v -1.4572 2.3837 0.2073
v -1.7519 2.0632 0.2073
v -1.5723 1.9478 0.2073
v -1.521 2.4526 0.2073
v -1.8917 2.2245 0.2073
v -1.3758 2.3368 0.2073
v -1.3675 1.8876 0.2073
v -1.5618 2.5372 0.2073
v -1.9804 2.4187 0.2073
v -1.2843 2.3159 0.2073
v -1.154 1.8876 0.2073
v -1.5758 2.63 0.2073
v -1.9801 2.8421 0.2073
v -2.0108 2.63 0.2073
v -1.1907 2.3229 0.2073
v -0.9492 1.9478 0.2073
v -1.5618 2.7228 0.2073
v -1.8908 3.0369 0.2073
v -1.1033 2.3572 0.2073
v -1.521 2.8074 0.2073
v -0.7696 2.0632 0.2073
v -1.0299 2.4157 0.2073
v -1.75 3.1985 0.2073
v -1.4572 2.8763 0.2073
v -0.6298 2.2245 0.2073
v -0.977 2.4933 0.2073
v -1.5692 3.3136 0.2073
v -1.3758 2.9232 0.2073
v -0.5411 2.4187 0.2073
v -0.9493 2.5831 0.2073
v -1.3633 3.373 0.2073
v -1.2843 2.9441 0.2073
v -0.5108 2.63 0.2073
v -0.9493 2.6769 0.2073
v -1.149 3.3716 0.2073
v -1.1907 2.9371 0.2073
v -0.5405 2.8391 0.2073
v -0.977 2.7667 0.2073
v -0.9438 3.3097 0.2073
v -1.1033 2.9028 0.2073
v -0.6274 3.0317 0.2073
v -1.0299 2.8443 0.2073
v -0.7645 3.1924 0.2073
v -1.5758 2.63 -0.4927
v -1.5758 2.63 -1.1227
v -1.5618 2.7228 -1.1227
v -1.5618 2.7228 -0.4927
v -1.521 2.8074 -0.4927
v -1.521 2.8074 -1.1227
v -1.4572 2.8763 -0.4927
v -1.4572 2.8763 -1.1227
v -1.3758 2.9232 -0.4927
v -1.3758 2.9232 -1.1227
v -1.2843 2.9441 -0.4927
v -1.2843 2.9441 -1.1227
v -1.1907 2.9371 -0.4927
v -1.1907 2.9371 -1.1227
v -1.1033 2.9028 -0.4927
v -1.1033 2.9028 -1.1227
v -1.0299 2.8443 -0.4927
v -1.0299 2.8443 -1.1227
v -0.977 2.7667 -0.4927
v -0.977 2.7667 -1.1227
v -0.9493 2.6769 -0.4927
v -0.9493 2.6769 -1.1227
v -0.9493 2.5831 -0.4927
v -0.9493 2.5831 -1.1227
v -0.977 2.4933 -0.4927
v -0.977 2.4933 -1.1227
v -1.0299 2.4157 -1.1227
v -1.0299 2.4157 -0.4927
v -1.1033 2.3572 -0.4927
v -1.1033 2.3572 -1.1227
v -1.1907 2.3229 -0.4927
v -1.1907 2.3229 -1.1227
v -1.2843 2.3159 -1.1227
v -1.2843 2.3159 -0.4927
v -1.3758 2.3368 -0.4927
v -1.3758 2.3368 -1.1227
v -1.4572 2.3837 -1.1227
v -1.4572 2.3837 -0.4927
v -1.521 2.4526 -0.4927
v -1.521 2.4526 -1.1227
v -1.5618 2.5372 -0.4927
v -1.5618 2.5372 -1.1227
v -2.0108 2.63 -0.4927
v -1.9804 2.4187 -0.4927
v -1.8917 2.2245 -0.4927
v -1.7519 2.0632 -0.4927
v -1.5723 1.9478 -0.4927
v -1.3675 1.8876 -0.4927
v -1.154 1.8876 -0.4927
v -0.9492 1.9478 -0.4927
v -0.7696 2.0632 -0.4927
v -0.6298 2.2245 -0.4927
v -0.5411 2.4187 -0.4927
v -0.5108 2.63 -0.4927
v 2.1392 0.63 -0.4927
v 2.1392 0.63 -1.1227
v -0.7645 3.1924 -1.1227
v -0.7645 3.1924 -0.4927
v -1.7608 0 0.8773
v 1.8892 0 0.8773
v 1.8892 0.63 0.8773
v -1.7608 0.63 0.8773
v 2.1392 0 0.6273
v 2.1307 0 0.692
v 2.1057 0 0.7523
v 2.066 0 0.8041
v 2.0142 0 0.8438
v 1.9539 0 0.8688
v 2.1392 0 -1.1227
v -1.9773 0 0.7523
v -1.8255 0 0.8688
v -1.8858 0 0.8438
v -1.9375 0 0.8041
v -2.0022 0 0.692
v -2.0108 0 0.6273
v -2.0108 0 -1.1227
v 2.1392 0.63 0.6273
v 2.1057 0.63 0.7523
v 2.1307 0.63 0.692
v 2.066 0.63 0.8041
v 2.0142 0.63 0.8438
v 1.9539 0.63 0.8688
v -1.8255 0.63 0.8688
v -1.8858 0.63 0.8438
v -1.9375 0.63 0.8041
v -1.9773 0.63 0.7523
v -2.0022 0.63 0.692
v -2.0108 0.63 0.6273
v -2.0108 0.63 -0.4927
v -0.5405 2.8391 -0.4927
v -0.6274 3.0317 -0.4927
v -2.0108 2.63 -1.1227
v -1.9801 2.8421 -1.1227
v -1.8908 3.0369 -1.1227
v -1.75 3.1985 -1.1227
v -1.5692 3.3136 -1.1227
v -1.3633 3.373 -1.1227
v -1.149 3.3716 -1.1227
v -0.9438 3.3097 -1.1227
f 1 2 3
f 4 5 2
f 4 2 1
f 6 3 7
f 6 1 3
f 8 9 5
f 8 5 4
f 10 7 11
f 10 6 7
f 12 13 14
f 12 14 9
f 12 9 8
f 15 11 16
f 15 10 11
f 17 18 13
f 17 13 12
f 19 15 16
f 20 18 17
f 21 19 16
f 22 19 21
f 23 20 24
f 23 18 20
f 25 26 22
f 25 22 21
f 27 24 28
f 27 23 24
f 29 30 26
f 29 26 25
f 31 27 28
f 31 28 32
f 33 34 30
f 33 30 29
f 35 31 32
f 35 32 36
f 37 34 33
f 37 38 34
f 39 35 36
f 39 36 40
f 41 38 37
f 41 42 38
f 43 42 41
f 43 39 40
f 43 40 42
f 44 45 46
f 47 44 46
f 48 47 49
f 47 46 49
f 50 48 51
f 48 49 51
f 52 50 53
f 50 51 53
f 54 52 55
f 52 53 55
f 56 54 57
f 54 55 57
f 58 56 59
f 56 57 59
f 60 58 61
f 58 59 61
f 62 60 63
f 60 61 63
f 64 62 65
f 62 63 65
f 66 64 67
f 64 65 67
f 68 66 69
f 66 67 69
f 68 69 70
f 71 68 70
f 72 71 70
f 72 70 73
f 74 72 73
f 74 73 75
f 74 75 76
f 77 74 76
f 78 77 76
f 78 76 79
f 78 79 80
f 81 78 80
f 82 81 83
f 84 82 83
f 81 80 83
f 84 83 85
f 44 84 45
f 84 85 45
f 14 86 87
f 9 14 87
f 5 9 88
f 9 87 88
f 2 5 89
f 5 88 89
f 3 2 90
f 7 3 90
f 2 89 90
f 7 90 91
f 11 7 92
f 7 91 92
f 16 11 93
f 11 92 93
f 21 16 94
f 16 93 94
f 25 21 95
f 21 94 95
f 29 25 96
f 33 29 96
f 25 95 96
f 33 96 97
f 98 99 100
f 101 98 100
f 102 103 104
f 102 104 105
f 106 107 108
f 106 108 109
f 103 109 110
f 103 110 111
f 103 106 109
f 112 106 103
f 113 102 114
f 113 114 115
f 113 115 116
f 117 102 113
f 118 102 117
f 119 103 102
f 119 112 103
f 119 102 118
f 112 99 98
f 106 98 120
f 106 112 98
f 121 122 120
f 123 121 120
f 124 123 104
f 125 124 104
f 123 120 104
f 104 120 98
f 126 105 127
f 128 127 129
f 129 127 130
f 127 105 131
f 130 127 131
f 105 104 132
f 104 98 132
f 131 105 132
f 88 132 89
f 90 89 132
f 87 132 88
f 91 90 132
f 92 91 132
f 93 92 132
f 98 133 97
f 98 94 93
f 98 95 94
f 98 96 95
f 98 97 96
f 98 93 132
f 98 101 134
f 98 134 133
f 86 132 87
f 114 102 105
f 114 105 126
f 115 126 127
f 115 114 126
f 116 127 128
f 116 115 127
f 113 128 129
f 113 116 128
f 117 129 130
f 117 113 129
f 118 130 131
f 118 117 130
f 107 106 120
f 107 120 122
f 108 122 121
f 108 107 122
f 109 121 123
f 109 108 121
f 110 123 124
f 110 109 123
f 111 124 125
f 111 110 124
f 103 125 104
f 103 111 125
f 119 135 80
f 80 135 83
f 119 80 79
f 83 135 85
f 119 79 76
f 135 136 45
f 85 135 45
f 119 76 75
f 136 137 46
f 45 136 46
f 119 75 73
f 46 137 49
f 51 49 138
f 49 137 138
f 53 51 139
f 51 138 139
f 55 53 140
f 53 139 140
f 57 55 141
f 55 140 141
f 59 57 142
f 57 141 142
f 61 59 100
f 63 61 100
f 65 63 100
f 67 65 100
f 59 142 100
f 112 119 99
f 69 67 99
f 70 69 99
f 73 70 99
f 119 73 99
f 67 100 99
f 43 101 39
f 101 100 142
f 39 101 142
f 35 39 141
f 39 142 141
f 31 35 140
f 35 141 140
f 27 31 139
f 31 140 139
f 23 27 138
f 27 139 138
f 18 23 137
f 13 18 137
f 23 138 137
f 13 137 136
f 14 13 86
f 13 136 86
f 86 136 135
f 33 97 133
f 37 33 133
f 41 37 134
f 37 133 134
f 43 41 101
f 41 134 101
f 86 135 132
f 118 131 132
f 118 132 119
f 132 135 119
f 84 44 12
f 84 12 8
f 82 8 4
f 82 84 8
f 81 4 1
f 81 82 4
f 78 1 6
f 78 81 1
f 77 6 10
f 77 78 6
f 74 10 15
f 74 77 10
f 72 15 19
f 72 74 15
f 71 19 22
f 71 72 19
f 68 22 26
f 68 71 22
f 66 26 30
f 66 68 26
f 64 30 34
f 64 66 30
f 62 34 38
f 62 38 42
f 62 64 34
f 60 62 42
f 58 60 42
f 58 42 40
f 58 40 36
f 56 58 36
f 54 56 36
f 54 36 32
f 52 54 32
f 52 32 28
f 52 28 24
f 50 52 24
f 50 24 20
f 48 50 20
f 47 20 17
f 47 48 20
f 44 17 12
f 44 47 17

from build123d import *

# Parameters (mm, degrees)
SALIENTE_EXTRUIR1_DEPTH = 0.63
CROQUIS2_R              = 0.315
SALIENTE_EXTRUIR2_DEPTH = 0.63
CROQUIS3_R              = 0.315
SALIENTE_EXTRUIR3_DEPTH = 0.7


with BuildPart() as part:
    # Croquis1 → Saliente-Extruir1 (new body)
    with BuildSketch(Plane(origin=(0, 0, 0), x_dir=(1, 0, 0), z_dir=(0, 1, 0))):
        with BuildLine():
            Line((-2.01076716, 1.122678331), (2.13923284, 1.122678331))
            Line((2.13923284, 1.122678331), (2.13923284, -0.627321669))
            ThreePointArc((2.13923284, -0.627321669), (2.066009535, -0.804098364), (1.88923284, -0.877321669))
            Line((1.88923284, -0.877321669), (-1.76076716, -0.877321669))
            ThreePointArc((-1.76076716, -0.877321669), (-1.937543855, -0.804098364), (-2.01076716, -0.627321669))
            Line((-2.01076716, -0.627321669), (-2.01076716, 1.122678331))
        make_face()
    extrude(amount=SALIENTE_EXTRUIR1_DEPTH)

    # Croquis2 → Saliente-Extruir2 (add)
    with BuildSketch(Plane(origin=(0, 0, -1.122678331), x_dir=(-1, 0, 0), z_dir=(0, 0, -1))):
        with BuildLine():
            Line((-2.13923284, 0.63), (0.764527387, 3.192357615))
            ThreePointArc((0.764527387, 3.192357615), (1.569247443, 3.313622641), (2.01076716, 2.63))
            Line((2.01076716, 2.63), (2.01076716, 0.63))
            Line((2.01076716, 0.63), (-2.13923284, 0.63))
        make_face()
        with Locations((1.26076716, 2.63)):
            Circle(CROQUIS2_R, mode=Mode.SUBTRACT)
    extrude(amount=-SALIENTE_EXTRUIR2_DEPTH)

    # Croquis3 → Saliente-Extruir3 (add)
    with BuildSketch(Plane.XY.offset(-0.492678331)):
        with BuildLine():
            ThreePointArc((-0.764527387, 3.192357615), (-1.569247443, 3.313622641), (-2.01076716, 2.63))
            ThreePointArc((-2.01076716, 2.63), (-1.26076716, 1.88), (-0.51076716, 2.63))
            ThreePointArc((-0.51076716, 2.63), (-0.577144519, 2.938480283), (-0.764527387, 3.192357615))
        make_face()
        with Locations(Location((-1.26076716, 2.63, 0), (0, 0, 180))):
            Circle(CROQUIS3_R, mode=Mode.SUBTRACT)
    extrude(amount=SALIENTE_EXTRUIR3_DEPTH)


solid = part.part
